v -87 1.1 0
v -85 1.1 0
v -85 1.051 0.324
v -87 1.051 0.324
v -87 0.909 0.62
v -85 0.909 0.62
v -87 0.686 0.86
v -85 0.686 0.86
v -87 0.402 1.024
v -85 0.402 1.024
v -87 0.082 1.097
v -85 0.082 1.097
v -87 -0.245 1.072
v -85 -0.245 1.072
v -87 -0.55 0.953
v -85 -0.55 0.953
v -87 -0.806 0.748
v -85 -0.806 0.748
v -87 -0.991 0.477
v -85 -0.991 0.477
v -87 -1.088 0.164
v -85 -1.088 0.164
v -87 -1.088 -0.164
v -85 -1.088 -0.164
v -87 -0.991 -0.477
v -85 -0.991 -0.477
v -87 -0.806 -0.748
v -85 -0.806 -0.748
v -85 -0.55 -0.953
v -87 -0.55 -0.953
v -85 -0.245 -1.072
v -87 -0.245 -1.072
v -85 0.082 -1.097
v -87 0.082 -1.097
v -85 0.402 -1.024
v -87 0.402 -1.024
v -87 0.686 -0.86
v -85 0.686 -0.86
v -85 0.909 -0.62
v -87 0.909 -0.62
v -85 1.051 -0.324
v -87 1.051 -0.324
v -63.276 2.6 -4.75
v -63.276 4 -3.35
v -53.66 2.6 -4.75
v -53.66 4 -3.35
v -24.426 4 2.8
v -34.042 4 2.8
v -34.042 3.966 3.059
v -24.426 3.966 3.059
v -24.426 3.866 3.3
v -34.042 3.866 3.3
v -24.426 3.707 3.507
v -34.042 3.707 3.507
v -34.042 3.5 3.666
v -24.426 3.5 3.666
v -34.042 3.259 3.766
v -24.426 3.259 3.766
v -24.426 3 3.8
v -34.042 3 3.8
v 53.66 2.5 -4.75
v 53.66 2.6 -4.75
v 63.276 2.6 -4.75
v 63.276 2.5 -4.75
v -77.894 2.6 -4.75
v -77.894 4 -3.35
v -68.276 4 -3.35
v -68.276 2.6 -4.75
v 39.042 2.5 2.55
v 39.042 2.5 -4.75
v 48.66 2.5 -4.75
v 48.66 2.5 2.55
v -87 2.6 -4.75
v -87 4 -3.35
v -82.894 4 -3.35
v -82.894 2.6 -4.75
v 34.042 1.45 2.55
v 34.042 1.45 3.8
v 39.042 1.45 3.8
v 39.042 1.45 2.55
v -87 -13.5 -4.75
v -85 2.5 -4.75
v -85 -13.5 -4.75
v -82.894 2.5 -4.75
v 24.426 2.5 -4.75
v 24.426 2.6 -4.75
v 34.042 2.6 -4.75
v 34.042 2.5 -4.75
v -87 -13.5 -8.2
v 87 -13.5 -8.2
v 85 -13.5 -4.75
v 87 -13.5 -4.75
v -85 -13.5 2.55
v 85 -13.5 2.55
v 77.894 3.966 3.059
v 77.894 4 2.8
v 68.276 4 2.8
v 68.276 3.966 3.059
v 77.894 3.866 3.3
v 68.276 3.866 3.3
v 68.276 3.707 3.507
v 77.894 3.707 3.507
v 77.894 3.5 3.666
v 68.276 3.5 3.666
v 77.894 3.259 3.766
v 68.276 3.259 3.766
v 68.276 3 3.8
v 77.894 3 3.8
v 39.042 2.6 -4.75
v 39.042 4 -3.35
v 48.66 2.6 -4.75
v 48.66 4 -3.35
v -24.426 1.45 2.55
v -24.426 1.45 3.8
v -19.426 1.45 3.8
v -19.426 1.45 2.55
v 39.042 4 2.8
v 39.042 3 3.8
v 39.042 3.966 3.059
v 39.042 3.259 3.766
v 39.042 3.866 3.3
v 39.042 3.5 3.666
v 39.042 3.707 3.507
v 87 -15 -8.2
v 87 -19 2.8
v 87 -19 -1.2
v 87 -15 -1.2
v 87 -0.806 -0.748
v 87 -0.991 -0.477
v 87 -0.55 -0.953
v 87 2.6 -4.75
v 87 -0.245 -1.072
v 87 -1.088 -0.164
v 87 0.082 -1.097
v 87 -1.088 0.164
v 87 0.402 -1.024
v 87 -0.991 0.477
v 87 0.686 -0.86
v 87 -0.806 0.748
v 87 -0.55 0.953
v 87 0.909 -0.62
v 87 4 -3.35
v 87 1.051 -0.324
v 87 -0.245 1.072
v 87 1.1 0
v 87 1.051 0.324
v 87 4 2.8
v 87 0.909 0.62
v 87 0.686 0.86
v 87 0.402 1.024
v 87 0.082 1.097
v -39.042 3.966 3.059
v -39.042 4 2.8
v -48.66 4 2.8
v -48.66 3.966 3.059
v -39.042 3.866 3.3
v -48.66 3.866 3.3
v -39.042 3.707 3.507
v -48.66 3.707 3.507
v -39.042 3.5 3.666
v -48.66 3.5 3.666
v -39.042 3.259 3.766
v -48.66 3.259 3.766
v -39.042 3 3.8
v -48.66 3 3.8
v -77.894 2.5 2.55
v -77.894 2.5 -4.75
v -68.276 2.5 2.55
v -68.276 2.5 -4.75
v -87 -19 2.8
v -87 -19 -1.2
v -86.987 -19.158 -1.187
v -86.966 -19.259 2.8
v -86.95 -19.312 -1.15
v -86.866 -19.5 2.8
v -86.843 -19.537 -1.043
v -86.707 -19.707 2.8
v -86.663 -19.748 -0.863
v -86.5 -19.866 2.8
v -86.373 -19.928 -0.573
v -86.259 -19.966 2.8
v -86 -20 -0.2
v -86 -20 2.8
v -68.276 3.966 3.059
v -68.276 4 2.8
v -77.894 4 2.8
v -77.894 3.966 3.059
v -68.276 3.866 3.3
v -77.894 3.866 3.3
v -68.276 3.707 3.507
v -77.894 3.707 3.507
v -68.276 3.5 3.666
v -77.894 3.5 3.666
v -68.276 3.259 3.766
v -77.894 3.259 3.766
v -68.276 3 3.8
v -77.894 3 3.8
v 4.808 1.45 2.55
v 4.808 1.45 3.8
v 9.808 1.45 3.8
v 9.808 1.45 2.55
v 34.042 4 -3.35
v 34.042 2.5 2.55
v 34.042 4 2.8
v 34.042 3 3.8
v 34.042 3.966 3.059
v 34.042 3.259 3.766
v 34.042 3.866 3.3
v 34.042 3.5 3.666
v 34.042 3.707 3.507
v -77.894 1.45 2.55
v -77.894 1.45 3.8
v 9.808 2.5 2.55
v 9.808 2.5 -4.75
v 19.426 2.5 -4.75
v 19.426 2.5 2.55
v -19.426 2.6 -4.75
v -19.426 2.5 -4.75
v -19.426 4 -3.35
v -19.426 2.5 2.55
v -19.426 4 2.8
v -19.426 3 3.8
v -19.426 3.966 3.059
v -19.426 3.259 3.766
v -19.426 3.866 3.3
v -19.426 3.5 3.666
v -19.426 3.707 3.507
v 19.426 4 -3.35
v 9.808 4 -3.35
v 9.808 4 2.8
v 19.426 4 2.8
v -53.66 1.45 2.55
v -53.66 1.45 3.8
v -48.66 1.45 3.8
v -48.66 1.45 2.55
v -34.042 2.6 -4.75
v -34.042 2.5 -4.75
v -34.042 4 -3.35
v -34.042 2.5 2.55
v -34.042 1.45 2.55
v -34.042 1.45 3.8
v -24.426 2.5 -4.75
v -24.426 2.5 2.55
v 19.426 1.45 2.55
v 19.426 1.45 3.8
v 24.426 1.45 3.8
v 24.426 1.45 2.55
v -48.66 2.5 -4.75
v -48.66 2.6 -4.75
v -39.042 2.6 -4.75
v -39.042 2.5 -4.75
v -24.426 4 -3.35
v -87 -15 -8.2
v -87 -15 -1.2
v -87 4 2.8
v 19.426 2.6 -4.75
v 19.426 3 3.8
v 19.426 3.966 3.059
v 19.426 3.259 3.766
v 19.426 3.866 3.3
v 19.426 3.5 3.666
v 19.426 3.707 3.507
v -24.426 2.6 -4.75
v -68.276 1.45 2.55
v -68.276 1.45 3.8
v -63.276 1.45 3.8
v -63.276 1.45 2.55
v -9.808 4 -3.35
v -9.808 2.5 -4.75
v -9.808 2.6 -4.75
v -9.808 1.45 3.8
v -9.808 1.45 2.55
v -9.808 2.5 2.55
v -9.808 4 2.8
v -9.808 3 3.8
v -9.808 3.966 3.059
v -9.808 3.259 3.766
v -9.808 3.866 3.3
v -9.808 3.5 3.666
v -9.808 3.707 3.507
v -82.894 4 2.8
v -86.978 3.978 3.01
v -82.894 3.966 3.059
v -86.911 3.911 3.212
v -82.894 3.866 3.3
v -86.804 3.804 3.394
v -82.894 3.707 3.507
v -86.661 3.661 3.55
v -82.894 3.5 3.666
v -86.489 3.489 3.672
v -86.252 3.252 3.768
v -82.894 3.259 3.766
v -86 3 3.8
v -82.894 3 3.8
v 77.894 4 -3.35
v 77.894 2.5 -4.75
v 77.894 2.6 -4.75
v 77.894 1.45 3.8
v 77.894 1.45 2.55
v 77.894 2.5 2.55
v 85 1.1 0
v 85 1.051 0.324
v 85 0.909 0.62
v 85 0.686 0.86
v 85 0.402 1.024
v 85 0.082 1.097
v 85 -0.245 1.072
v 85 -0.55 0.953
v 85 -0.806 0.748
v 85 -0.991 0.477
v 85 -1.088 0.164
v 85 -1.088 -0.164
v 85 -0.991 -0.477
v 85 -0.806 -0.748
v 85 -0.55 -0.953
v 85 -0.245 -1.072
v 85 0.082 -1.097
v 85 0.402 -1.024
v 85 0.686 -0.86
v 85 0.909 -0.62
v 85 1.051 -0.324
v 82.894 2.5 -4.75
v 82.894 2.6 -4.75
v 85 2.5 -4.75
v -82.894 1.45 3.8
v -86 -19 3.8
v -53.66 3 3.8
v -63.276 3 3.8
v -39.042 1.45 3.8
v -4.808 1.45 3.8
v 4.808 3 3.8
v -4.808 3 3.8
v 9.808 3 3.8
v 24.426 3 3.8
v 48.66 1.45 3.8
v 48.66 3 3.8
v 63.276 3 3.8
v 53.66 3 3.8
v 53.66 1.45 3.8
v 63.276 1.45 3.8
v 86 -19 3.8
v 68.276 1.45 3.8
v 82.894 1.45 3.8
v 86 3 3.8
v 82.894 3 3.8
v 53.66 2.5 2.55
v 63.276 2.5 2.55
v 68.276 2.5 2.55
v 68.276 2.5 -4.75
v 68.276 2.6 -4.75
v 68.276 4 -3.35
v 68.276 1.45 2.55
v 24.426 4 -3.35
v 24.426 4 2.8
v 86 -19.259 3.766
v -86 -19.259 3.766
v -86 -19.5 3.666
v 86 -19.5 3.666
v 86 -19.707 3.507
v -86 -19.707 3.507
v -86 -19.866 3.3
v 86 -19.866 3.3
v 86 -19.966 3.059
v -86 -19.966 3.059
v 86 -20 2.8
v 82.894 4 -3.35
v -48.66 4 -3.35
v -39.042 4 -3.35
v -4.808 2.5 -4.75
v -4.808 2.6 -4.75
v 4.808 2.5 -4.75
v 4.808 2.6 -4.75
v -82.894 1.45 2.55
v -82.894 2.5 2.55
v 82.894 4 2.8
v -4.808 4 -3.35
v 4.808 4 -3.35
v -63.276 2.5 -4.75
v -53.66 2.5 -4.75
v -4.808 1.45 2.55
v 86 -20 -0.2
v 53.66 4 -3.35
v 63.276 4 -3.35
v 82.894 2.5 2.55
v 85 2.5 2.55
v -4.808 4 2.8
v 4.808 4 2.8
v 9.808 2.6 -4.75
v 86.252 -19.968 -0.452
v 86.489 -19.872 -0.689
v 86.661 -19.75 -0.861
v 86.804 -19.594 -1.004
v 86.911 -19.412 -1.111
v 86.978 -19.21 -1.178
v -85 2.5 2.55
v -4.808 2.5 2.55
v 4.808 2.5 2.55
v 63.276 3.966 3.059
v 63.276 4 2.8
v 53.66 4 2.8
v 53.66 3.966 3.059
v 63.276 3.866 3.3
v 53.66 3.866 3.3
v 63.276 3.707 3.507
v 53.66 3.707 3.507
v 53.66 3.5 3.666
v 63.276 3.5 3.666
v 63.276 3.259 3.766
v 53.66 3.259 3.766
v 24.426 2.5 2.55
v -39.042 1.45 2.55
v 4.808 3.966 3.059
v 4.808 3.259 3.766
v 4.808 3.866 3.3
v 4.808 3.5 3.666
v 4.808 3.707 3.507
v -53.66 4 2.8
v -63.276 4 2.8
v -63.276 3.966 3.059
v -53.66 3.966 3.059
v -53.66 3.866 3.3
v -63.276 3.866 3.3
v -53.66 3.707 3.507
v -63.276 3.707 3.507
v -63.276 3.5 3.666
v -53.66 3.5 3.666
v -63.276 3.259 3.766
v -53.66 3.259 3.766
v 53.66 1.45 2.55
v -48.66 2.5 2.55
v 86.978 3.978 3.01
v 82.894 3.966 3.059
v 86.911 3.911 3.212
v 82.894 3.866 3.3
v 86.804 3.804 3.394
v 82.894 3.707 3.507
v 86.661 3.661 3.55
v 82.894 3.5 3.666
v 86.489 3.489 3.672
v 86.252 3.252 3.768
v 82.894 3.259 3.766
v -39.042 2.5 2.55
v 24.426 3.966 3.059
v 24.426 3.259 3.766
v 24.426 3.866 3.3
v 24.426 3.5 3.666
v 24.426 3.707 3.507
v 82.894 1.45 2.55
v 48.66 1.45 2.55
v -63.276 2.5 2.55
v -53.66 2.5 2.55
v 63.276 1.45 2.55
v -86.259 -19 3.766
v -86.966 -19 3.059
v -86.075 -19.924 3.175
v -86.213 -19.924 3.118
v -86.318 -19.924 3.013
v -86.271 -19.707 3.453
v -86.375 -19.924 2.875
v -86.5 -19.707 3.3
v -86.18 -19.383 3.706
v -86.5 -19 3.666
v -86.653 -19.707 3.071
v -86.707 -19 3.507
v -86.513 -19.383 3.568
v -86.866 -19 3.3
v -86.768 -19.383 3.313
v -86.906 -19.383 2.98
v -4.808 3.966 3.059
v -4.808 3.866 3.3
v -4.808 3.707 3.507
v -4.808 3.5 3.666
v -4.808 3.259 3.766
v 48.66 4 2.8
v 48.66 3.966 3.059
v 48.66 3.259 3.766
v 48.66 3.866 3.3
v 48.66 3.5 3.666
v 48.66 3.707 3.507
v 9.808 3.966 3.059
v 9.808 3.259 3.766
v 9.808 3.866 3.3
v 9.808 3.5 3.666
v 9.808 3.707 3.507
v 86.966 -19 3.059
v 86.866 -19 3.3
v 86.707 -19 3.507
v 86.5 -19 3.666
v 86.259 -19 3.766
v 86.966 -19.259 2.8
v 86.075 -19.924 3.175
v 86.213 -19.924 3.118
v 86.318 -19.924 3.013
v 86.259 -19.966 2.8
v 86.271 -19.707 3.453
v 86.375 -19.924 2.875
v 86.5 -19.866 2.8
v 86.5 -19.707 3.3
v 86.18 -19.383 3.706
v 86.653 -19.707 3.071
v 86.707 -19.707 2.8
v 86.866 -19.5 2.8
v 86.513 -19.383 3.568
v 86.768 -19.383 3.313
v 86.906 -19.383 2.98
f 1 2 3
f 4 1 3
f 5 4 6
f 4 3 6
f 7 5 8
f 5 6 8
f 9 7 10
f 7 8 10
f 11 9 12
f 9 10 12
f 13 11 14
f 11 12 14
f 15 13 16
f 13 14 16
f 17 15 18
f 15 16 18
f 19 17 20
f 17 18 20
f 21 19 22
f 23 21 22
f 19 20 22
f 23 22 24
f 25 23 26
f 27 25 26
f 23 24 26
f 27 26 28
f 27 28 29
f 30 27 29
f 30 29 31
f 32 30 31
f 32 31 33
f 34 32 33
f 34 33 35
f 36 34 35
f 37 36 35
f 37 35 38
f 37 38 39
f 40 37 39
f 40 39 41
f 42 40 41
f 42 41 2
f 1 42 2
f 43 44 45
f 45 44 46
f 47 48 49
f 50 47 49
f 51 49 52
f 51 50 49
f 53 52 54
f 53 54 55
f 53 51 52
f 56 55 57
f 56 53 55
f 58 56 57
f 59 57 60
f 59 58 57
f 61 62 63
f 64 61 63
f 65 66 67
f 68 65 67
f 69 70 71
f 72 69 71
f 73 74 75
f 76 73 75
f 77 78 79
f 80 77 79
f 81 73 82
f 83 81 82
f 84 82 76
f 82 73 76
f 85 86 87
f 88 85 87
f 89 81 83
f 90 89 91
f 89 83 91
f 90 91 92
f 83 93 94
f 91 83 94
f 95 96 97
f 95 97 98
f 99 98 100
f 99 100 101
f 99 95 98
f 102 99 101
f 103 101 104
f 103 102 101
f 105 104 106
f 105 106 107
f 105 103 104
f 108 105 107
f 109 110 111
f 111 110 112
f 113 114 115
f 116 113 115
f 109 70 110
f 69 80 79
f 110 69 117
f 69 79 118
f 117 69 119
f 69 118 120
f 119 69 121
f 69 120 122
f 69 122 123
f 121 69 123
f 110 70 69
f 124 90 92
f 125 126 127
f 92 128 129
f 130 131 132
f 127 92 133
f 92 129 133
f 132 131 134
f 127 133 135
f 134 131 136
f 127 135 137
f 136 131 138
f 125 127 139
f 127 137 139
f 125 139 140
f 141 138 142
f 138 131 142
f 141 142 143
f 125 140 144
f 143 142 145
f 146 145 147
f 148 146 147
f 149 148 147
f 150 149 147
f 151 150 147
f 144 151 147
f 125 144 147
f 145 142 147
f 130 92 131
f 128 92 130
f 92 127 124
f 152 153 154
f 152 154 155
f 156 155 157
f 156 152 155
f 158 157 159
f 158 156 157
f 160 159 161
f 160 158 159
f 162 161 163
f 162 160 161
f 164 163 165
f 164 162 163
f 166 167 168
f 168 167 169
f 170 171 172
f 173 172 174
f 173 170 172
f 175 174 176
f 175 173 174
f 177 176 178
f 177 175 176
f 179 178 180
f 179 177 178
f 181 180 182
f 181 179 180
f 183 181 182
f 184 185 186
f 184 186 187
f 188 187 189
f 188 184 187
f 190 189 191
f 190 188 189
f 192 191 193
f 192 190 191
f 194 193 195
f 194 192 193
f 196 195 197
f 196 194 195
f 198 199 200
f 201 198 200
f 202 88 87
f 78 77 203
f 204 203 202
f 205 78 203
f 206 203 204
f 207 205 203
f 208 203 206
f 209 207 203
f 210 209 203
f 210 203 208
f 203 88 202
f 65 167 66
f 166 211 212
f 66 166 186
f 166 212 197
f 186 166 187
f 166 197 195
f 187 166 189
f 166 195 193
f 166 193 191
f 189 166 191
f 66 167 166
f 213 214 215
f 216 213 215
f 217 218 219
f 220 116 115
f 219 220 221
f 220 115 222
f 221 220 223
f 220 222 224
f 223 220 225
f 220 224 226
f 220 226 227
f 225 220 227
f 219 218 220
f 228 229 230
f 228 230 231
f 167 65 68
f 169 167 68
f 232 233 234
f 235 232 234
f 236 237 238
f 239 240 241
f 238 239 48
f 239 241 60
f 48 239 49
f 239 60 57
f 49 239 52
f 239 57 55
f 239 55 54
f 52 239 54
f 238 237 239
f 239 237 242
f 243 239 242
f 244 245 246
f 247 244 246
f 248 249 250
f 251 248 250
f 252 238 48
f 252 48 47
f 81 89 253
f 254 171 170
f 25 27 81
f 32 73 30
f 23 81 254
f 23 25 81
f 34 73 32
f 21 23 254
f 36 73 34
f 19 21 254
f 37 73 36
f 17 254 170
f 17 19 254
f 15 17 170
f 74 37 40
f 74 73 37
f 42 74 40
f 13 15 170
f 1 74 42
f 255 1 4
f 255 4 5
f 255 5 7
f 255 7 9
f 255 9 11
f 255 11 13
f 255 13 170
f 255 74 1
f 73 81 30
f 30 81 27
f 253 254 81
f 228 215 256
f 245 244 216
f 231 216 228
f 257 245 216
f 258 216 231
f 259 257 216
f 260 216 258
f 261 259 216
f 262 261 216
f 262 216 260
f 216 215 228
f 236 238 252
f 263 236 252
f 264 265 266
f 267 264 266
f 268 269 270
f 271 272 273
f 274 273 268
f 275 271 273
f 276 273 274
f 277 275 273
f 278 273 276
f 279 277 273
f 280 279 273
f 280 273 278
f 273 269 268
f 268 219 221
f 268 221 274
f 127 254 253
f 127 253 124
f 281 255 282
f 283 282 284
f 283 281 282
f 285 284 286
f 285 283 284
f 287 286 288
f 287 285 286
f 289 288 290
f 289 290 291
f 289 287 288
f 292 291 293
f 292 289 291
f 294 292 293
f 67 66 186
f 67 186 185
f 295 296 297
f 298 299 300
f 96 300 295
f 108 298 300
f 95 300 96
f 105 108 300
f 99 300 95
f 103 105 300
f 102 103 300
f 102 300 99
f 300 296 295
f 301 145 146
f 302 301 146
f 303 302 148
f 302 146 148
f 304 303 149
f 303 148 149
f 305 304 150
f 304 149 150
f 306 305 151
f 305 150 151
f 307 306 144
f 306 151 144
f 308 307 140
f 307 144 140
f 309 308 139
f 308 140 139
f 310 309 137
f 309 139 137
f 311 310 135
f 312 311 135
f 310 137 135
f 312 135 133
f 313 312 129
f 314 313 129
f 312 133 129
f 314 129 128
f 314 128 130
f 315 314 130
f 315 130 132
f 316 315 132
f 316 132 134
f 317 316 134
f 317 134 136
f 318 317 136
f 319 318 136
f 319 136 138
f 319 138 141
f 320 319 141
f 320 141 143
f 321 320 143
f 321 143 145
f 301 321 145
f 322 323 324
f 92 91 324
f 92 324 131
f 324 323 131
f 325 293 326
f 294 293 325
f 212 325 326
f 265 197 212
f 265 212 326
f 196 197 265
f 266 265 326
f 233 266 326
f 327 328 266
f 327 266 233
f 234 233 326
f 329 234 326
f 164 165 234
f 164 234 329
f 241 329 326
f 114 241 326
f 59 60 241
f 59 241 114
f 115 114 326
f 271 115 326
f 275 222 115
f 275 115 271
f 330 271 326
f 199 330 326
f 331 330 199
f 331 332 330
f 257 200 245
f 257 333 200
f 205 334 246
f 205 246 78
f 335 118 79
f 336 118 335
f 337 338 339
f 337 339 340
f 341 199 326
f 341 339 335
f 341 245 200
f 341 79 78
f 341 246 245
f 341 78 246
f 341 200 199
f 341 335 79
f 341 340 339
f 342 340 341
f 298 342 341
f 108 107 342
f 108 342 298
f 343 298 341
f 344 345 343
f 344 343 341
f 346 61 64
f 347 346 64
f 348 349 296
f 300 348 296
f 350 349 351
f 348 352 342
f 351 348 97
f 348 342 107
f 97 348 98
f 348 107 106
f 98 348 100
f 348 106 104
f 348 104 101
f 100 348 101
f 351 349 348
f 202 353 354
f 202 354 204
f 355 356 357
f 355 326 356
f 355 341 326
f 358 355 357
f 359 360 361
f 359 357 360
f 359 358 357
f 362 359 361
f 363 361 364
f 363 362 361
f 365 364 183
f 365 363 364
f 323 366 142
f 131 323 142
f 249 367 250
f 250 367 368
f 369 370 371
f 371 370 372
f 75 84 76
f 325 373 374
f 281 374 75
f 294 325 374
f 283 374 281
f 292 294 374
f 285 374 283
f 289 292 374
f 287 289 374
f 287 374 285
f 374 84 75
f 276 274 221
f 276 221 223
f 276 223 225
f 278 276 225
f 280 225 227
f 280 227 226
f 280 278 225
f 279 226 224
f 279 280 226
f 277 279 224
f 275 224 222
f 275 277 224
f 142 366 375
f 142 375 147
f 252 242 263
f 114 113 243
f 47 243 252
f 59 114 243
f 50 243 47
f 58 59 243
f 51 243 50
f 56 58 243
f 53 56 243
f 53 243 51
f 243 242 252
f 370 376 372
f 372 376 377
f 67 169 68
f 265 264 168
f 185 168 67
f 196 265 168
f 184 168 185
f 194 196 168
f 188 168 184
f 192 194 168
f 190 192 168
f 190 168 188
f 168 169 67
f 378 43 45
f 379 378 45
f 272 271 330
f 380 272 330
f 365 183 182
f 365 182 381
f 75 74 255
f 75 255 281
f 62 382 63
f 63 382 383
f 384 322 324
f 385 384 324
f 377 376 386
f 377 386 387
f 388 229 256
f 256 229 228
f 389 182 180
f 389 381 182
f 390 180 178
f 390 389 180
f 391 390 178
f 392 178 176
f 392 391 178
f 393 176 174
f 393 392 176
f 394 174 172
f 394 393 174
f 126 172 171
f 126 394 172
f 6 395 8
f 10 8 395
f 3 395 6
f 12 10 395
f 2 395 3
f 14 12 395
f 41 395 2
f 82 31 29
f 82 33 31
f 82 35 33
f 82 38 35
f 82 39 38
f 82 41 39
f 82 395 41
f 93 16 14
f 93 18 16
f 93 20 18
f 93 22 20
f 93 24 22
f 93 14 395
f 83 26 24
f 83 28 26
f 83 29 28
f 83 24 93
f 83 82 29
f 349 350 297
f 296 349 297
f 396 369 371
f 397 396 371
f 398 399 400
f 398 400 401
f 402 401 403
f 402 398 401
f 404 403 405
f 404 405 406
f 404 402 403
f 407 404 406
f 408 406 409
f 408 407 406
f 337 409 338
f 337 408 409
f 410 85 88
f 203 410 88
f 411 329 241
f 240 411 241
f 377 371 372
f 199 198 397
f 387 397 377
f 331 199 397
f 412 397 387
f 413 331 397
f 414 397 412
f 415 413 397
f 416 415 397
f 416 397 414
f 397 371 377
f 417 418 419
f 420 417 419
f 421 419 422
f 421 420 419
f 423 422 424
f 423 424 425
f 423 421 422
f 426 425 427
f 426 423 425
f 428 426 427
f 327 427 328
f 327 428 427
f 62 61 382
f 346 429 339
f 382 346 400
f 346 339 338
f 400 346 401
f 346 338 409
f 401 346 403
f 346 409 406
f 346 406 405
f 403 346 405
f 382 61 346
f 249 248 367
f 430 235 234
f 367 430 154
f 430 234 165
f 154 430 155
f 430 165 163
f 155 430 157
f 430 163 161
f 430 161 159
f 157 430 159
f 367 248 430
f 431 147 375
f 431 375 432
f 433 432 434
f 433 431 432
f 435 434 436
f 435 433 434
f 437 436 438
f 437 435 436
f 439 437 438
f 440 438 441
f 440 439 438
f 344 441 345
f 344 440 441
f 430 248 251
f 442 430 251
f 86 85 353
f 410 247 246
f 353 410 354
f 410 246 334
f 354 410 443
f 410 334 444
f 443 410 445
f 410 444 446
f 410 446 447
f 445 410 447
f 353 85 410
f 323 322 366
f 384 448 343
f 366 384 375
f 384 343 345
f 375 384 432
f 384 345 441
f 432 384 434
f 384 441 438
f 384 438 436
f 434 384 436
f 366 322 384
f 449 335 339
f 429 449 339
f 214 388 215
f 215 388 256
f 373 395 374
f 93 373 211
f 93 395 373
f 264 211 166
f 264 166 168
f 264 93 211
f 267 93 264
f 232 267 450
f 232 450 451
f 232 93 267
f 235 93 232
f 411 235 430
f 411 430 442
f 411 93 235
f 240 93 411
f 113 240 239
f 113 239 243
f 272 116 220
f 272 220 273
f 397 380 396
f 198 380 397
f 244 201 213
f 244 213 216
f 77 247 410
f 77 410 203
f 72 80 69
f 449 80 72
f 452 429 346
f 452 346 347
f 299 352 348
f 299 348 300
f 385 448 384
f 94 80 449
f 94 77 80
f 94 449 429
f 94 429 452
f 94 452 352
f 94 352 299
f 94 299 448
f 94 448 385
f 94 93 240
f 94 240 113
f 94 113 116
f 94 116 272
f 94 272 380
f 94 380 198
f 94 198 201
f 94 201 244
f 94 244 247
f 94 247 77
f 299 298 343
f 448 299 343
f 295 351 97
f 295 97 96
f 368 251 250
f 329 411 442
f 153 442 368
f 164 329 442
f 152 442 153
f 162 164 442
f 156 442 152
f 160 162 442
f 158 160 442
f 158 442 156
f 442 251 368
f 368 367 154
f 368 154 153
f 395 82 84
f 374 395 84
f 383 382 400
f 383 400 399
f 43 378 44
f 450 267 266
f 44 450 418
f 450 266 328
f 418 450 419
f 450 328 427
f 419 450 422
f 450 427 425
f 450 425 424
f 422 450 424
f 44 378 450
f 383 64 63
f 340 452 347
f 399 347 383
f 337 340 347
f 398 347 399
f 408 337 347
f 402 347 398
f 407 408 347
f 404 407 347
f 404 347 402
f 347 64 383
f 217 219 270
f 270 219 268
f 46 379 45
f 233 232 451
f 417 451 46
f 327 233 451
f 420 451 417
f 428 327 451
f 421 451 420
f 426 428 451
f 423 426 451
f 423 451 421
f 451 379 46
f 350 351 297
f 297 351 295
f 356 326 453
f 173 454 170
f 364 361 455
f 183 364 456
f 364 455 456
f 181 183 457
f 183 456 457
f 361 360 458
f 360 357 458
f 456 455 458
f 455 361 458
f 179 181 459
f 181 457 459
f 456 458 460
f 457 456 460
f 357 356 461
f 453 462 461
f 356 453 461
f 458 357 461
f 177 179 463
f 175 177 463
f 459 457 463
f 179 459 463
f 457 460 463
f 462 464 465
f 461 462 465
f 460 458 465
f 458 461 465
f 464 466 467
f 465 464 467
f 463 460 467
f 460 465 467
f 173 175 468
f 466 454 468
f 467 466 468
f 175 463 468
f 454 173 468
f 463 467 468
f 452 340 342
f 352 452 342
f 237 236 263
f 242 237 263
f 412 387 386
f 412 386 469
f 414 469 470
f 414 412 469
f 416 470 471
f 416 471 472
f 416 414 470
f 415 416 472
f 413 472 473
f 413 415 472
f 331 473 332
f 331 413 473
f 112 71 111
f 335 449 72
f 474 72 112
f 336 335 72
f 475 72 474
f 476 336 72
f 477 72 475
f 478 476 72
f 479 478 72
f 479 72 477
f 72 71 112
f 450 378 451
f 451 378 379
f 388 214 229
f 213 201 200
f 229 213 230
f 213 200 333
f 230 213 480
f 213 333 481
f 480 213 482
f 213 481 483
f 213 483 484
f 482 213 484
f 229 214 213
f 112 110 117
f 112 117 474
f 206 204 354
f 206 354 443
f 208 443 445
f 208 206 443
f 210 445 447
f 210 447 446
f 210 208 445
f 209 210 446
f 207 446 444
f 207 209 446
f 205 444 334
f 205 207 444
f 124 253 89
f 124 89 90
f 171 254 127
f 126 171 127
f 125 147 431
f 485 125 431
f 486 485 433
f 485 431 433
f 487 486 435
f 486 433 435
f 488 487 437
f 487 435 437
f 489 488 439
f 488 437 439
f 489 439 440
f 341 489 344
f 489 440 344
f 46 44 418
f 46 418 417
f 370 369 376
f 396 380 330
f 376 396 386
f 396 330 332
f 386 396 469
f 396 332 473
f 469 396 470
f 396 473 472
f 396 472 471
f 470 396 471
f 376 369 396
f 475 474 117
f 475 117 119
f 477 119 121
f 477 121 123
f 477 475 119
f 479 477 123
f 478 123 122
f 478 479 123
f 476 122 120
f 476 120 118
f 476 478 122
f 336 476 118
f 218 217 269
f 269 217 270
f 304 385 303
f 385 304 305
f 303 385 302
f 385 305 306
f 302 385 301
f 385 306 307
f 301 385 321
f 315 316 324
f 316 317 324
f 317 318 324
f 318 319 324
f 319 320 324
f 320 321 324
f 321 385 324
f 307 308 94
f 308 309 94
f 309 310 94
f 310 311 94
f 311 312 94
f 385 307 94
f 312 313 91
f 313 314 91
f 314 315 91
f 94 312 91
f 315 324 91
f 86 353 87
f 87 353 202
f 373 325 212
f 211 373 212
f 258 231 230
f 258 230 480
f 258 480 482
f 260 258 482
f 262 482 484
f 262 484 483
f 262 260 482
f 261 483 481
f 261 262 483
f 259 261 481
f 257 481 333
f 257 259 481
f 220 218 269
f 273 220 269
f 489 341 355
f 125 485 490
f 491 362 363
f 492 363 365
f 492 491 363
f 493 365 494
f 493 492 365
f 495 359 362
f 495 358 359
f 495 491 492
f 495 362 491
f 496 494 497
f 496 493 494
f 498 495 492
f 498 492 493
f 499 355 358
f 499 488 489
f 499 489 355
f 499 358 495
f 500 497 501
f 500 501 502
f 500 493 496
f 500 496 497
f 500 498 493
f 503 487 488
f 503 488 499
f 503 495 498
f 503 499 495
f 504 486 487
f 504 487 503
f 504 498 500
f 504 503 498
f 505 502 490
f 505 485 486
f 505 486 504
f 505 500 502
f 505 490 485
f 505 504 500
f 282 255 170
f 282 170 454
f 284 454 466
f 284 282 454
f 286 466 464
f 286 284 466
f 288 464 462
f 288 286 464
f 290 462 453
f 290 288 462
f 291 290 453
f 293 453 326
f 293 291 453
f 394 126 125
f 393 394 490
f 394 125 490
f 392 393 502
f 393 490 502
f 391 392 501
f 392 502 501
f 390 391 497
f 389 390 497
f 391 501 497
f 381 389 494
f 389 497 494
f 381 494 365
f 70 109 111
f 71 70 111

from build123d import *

# Parameters (mm, degrees)
SKETCH_W        = 174
SKETCH_H        = 19
PAD_DEPTH       = 8.55
SKETCH001_W     = 170
SKETCH001_H     = 16
POCKET_DEPTH    = 7.3
SKETCH002_R     = 1.1
HOLE_DEPTH      = 174.001
CHAMFER_SIZE    = 1.4
SKETCH003_W     = 174
SKETCH003_H     = 1.5
PAD001_DEPTH    = 3.45
SKETCH004_W     = 174
SKETCH004_H     = 5
PAD002_DEPTH    = 5
FILLET_R        = 1
SKETCH005_W     = 5
SKETCH005_H     = 10.149898
SKETCH005_H_2   = 10.668564
SKETCH005_H_3   = 8.55
SKETCH005_H_4   = 9.73434
SKETCH005_H_5   = 10.175496
POCKET001_DEPTH = 20


with BuildPart() as part:
    # Sketch → Pad (new body)
    with BuildSketch(Plane.XY):
        with Locations((0, -0.5)):
            Rectangle(SKETCH_W, SKETCH_H)
    extrude(amount=PAD_DEPTH)

    # Sketch001 → Pocket (cut)
    with BuildSketch(Plane(origin=(0, 0, 0), x_dir=(1, 0, 0), z_dir=(0, 0, -1))):
        with Locations((0, 0.5)):
            Rectangle(SKETCH001_W, SKETCH001_H)
    extrude(amount=-POCKET_DEPTH, mode=Mode.SUBTRACT)

    # Sketch002 (on Face3 of Pocket) → Hole (cut, through all)
    with BuildSketch(Plane.YZ.offset(87)):
        with Locations((5, 4.75)):
            Circle(SKETCH002_R)
    extrude(amount=-HOLE_DEPTH, mode=Mode.SUBTRACT)

    # Chamfer
    chamfer_edges = [part.edges().sort_by_distance(p)[0] for p in [
        (0, 9, 0),
    ]]
    chamfer(chamfer_edges, length=CHAMFER_SIZE)

    # Sketch003 (on Face6 of Chamfer) → Pad001 (join)
    with BuildSketch(Plane(origin=(0, 0, 0), x_dir=(1, 0, 0), z_dir=(0, 0, -1))):
        with Locations((0, 9.25)):
            Rectangle(SKETCH003_W, SKETCH003_H)
    extrude(amount=PAD001_DEPTH)

    # Sketch004 (on Face8 of Pad001) → Pad002 (join)
    with BuildSketch(Plane.XZ.offset(10)):
        with Locations((0, 6.05)):
            Rectangle(SKETCH004_W, SKETCH004_H)
    extrude(amount=PAD002_DEPTH)

    # Fillet
    fillet_edges = [part.edges().sort_by_distance(p)[0] for p in [
        (-87, -12.5, 8.55),
        (-87, -0.5, 8.55),
        (87, -0.5, 8.55),
        (87, -12.5, 8.55),
        (0, 9, 8.55),
        (0, -15, 8.55),
        (87, -15, 6.05),
        (0, -15, 3.55),
        (-87, -15, 6.05),
    ]]
    fillet(fillet_edges, radius=FILLET_R)

    # Sketch005 (on Face12 of Fillet) → Pocket001 (cut)
    with BuildSketch(Plane.XY.offset(8.55)):
        with Locations((-7.3085, 11.524949)):
            Rectangle(SKETCH005_W, SKETCH005_H)
        with Locations((7.3085, 11.784282)):
            Rectangle(SKETCH005_W, SKETCH005_H_2)
        with Locations((-21.9255, 10.725)):
            Rectangle(SKETCH005_W, SKETCH005_H_3)
        with Locations((-36.5425, 10.725)):
            Rectangle(SKETCH005_W, SKETCH005_H_3)
        with Locations((-51.1595, 10.725)):
            Rectangle(SKETCH005_W, SKETCH005_H_3)
        with Locations((-65.7765, 10.725)):
            Rectangle(SKETCH005_W, SKETCH005_H_3)
        with Locations((-80.3935, 10.725)):
            Rectangle(SKETCH005_W, SKETCH005_H_3)
        with Locations((21.9255, 11.31717)):
            Rectangle(SKETCH005_W, SKETCH005_H_4)
        with Locations((36.5425, 11.537748)):
            Rectangle(SKETCH005_W, SKETCH005_H_5)
        with Locations((51.1595, 10.725)):
            Rectangle(SKETCH005_W, SKETCH005_H_3)
        with Locations((65.7765, 10.725)):
            Rectangle(SKETCH005_W, SKETCH005_H_3)
        with Locations((80.3935, 10.725)):
            Rectangle(SKETCH005_W, SKETCH005_H_3)
    extrude(amount=-POCKET001_DEPTH, mode=Mode.SUBTRACT)


with BuildPart() as part_1:
    # Body placement: moved
    add(part.part.moved(Location((0, -5, -4.75))))


solid = part_1.part
